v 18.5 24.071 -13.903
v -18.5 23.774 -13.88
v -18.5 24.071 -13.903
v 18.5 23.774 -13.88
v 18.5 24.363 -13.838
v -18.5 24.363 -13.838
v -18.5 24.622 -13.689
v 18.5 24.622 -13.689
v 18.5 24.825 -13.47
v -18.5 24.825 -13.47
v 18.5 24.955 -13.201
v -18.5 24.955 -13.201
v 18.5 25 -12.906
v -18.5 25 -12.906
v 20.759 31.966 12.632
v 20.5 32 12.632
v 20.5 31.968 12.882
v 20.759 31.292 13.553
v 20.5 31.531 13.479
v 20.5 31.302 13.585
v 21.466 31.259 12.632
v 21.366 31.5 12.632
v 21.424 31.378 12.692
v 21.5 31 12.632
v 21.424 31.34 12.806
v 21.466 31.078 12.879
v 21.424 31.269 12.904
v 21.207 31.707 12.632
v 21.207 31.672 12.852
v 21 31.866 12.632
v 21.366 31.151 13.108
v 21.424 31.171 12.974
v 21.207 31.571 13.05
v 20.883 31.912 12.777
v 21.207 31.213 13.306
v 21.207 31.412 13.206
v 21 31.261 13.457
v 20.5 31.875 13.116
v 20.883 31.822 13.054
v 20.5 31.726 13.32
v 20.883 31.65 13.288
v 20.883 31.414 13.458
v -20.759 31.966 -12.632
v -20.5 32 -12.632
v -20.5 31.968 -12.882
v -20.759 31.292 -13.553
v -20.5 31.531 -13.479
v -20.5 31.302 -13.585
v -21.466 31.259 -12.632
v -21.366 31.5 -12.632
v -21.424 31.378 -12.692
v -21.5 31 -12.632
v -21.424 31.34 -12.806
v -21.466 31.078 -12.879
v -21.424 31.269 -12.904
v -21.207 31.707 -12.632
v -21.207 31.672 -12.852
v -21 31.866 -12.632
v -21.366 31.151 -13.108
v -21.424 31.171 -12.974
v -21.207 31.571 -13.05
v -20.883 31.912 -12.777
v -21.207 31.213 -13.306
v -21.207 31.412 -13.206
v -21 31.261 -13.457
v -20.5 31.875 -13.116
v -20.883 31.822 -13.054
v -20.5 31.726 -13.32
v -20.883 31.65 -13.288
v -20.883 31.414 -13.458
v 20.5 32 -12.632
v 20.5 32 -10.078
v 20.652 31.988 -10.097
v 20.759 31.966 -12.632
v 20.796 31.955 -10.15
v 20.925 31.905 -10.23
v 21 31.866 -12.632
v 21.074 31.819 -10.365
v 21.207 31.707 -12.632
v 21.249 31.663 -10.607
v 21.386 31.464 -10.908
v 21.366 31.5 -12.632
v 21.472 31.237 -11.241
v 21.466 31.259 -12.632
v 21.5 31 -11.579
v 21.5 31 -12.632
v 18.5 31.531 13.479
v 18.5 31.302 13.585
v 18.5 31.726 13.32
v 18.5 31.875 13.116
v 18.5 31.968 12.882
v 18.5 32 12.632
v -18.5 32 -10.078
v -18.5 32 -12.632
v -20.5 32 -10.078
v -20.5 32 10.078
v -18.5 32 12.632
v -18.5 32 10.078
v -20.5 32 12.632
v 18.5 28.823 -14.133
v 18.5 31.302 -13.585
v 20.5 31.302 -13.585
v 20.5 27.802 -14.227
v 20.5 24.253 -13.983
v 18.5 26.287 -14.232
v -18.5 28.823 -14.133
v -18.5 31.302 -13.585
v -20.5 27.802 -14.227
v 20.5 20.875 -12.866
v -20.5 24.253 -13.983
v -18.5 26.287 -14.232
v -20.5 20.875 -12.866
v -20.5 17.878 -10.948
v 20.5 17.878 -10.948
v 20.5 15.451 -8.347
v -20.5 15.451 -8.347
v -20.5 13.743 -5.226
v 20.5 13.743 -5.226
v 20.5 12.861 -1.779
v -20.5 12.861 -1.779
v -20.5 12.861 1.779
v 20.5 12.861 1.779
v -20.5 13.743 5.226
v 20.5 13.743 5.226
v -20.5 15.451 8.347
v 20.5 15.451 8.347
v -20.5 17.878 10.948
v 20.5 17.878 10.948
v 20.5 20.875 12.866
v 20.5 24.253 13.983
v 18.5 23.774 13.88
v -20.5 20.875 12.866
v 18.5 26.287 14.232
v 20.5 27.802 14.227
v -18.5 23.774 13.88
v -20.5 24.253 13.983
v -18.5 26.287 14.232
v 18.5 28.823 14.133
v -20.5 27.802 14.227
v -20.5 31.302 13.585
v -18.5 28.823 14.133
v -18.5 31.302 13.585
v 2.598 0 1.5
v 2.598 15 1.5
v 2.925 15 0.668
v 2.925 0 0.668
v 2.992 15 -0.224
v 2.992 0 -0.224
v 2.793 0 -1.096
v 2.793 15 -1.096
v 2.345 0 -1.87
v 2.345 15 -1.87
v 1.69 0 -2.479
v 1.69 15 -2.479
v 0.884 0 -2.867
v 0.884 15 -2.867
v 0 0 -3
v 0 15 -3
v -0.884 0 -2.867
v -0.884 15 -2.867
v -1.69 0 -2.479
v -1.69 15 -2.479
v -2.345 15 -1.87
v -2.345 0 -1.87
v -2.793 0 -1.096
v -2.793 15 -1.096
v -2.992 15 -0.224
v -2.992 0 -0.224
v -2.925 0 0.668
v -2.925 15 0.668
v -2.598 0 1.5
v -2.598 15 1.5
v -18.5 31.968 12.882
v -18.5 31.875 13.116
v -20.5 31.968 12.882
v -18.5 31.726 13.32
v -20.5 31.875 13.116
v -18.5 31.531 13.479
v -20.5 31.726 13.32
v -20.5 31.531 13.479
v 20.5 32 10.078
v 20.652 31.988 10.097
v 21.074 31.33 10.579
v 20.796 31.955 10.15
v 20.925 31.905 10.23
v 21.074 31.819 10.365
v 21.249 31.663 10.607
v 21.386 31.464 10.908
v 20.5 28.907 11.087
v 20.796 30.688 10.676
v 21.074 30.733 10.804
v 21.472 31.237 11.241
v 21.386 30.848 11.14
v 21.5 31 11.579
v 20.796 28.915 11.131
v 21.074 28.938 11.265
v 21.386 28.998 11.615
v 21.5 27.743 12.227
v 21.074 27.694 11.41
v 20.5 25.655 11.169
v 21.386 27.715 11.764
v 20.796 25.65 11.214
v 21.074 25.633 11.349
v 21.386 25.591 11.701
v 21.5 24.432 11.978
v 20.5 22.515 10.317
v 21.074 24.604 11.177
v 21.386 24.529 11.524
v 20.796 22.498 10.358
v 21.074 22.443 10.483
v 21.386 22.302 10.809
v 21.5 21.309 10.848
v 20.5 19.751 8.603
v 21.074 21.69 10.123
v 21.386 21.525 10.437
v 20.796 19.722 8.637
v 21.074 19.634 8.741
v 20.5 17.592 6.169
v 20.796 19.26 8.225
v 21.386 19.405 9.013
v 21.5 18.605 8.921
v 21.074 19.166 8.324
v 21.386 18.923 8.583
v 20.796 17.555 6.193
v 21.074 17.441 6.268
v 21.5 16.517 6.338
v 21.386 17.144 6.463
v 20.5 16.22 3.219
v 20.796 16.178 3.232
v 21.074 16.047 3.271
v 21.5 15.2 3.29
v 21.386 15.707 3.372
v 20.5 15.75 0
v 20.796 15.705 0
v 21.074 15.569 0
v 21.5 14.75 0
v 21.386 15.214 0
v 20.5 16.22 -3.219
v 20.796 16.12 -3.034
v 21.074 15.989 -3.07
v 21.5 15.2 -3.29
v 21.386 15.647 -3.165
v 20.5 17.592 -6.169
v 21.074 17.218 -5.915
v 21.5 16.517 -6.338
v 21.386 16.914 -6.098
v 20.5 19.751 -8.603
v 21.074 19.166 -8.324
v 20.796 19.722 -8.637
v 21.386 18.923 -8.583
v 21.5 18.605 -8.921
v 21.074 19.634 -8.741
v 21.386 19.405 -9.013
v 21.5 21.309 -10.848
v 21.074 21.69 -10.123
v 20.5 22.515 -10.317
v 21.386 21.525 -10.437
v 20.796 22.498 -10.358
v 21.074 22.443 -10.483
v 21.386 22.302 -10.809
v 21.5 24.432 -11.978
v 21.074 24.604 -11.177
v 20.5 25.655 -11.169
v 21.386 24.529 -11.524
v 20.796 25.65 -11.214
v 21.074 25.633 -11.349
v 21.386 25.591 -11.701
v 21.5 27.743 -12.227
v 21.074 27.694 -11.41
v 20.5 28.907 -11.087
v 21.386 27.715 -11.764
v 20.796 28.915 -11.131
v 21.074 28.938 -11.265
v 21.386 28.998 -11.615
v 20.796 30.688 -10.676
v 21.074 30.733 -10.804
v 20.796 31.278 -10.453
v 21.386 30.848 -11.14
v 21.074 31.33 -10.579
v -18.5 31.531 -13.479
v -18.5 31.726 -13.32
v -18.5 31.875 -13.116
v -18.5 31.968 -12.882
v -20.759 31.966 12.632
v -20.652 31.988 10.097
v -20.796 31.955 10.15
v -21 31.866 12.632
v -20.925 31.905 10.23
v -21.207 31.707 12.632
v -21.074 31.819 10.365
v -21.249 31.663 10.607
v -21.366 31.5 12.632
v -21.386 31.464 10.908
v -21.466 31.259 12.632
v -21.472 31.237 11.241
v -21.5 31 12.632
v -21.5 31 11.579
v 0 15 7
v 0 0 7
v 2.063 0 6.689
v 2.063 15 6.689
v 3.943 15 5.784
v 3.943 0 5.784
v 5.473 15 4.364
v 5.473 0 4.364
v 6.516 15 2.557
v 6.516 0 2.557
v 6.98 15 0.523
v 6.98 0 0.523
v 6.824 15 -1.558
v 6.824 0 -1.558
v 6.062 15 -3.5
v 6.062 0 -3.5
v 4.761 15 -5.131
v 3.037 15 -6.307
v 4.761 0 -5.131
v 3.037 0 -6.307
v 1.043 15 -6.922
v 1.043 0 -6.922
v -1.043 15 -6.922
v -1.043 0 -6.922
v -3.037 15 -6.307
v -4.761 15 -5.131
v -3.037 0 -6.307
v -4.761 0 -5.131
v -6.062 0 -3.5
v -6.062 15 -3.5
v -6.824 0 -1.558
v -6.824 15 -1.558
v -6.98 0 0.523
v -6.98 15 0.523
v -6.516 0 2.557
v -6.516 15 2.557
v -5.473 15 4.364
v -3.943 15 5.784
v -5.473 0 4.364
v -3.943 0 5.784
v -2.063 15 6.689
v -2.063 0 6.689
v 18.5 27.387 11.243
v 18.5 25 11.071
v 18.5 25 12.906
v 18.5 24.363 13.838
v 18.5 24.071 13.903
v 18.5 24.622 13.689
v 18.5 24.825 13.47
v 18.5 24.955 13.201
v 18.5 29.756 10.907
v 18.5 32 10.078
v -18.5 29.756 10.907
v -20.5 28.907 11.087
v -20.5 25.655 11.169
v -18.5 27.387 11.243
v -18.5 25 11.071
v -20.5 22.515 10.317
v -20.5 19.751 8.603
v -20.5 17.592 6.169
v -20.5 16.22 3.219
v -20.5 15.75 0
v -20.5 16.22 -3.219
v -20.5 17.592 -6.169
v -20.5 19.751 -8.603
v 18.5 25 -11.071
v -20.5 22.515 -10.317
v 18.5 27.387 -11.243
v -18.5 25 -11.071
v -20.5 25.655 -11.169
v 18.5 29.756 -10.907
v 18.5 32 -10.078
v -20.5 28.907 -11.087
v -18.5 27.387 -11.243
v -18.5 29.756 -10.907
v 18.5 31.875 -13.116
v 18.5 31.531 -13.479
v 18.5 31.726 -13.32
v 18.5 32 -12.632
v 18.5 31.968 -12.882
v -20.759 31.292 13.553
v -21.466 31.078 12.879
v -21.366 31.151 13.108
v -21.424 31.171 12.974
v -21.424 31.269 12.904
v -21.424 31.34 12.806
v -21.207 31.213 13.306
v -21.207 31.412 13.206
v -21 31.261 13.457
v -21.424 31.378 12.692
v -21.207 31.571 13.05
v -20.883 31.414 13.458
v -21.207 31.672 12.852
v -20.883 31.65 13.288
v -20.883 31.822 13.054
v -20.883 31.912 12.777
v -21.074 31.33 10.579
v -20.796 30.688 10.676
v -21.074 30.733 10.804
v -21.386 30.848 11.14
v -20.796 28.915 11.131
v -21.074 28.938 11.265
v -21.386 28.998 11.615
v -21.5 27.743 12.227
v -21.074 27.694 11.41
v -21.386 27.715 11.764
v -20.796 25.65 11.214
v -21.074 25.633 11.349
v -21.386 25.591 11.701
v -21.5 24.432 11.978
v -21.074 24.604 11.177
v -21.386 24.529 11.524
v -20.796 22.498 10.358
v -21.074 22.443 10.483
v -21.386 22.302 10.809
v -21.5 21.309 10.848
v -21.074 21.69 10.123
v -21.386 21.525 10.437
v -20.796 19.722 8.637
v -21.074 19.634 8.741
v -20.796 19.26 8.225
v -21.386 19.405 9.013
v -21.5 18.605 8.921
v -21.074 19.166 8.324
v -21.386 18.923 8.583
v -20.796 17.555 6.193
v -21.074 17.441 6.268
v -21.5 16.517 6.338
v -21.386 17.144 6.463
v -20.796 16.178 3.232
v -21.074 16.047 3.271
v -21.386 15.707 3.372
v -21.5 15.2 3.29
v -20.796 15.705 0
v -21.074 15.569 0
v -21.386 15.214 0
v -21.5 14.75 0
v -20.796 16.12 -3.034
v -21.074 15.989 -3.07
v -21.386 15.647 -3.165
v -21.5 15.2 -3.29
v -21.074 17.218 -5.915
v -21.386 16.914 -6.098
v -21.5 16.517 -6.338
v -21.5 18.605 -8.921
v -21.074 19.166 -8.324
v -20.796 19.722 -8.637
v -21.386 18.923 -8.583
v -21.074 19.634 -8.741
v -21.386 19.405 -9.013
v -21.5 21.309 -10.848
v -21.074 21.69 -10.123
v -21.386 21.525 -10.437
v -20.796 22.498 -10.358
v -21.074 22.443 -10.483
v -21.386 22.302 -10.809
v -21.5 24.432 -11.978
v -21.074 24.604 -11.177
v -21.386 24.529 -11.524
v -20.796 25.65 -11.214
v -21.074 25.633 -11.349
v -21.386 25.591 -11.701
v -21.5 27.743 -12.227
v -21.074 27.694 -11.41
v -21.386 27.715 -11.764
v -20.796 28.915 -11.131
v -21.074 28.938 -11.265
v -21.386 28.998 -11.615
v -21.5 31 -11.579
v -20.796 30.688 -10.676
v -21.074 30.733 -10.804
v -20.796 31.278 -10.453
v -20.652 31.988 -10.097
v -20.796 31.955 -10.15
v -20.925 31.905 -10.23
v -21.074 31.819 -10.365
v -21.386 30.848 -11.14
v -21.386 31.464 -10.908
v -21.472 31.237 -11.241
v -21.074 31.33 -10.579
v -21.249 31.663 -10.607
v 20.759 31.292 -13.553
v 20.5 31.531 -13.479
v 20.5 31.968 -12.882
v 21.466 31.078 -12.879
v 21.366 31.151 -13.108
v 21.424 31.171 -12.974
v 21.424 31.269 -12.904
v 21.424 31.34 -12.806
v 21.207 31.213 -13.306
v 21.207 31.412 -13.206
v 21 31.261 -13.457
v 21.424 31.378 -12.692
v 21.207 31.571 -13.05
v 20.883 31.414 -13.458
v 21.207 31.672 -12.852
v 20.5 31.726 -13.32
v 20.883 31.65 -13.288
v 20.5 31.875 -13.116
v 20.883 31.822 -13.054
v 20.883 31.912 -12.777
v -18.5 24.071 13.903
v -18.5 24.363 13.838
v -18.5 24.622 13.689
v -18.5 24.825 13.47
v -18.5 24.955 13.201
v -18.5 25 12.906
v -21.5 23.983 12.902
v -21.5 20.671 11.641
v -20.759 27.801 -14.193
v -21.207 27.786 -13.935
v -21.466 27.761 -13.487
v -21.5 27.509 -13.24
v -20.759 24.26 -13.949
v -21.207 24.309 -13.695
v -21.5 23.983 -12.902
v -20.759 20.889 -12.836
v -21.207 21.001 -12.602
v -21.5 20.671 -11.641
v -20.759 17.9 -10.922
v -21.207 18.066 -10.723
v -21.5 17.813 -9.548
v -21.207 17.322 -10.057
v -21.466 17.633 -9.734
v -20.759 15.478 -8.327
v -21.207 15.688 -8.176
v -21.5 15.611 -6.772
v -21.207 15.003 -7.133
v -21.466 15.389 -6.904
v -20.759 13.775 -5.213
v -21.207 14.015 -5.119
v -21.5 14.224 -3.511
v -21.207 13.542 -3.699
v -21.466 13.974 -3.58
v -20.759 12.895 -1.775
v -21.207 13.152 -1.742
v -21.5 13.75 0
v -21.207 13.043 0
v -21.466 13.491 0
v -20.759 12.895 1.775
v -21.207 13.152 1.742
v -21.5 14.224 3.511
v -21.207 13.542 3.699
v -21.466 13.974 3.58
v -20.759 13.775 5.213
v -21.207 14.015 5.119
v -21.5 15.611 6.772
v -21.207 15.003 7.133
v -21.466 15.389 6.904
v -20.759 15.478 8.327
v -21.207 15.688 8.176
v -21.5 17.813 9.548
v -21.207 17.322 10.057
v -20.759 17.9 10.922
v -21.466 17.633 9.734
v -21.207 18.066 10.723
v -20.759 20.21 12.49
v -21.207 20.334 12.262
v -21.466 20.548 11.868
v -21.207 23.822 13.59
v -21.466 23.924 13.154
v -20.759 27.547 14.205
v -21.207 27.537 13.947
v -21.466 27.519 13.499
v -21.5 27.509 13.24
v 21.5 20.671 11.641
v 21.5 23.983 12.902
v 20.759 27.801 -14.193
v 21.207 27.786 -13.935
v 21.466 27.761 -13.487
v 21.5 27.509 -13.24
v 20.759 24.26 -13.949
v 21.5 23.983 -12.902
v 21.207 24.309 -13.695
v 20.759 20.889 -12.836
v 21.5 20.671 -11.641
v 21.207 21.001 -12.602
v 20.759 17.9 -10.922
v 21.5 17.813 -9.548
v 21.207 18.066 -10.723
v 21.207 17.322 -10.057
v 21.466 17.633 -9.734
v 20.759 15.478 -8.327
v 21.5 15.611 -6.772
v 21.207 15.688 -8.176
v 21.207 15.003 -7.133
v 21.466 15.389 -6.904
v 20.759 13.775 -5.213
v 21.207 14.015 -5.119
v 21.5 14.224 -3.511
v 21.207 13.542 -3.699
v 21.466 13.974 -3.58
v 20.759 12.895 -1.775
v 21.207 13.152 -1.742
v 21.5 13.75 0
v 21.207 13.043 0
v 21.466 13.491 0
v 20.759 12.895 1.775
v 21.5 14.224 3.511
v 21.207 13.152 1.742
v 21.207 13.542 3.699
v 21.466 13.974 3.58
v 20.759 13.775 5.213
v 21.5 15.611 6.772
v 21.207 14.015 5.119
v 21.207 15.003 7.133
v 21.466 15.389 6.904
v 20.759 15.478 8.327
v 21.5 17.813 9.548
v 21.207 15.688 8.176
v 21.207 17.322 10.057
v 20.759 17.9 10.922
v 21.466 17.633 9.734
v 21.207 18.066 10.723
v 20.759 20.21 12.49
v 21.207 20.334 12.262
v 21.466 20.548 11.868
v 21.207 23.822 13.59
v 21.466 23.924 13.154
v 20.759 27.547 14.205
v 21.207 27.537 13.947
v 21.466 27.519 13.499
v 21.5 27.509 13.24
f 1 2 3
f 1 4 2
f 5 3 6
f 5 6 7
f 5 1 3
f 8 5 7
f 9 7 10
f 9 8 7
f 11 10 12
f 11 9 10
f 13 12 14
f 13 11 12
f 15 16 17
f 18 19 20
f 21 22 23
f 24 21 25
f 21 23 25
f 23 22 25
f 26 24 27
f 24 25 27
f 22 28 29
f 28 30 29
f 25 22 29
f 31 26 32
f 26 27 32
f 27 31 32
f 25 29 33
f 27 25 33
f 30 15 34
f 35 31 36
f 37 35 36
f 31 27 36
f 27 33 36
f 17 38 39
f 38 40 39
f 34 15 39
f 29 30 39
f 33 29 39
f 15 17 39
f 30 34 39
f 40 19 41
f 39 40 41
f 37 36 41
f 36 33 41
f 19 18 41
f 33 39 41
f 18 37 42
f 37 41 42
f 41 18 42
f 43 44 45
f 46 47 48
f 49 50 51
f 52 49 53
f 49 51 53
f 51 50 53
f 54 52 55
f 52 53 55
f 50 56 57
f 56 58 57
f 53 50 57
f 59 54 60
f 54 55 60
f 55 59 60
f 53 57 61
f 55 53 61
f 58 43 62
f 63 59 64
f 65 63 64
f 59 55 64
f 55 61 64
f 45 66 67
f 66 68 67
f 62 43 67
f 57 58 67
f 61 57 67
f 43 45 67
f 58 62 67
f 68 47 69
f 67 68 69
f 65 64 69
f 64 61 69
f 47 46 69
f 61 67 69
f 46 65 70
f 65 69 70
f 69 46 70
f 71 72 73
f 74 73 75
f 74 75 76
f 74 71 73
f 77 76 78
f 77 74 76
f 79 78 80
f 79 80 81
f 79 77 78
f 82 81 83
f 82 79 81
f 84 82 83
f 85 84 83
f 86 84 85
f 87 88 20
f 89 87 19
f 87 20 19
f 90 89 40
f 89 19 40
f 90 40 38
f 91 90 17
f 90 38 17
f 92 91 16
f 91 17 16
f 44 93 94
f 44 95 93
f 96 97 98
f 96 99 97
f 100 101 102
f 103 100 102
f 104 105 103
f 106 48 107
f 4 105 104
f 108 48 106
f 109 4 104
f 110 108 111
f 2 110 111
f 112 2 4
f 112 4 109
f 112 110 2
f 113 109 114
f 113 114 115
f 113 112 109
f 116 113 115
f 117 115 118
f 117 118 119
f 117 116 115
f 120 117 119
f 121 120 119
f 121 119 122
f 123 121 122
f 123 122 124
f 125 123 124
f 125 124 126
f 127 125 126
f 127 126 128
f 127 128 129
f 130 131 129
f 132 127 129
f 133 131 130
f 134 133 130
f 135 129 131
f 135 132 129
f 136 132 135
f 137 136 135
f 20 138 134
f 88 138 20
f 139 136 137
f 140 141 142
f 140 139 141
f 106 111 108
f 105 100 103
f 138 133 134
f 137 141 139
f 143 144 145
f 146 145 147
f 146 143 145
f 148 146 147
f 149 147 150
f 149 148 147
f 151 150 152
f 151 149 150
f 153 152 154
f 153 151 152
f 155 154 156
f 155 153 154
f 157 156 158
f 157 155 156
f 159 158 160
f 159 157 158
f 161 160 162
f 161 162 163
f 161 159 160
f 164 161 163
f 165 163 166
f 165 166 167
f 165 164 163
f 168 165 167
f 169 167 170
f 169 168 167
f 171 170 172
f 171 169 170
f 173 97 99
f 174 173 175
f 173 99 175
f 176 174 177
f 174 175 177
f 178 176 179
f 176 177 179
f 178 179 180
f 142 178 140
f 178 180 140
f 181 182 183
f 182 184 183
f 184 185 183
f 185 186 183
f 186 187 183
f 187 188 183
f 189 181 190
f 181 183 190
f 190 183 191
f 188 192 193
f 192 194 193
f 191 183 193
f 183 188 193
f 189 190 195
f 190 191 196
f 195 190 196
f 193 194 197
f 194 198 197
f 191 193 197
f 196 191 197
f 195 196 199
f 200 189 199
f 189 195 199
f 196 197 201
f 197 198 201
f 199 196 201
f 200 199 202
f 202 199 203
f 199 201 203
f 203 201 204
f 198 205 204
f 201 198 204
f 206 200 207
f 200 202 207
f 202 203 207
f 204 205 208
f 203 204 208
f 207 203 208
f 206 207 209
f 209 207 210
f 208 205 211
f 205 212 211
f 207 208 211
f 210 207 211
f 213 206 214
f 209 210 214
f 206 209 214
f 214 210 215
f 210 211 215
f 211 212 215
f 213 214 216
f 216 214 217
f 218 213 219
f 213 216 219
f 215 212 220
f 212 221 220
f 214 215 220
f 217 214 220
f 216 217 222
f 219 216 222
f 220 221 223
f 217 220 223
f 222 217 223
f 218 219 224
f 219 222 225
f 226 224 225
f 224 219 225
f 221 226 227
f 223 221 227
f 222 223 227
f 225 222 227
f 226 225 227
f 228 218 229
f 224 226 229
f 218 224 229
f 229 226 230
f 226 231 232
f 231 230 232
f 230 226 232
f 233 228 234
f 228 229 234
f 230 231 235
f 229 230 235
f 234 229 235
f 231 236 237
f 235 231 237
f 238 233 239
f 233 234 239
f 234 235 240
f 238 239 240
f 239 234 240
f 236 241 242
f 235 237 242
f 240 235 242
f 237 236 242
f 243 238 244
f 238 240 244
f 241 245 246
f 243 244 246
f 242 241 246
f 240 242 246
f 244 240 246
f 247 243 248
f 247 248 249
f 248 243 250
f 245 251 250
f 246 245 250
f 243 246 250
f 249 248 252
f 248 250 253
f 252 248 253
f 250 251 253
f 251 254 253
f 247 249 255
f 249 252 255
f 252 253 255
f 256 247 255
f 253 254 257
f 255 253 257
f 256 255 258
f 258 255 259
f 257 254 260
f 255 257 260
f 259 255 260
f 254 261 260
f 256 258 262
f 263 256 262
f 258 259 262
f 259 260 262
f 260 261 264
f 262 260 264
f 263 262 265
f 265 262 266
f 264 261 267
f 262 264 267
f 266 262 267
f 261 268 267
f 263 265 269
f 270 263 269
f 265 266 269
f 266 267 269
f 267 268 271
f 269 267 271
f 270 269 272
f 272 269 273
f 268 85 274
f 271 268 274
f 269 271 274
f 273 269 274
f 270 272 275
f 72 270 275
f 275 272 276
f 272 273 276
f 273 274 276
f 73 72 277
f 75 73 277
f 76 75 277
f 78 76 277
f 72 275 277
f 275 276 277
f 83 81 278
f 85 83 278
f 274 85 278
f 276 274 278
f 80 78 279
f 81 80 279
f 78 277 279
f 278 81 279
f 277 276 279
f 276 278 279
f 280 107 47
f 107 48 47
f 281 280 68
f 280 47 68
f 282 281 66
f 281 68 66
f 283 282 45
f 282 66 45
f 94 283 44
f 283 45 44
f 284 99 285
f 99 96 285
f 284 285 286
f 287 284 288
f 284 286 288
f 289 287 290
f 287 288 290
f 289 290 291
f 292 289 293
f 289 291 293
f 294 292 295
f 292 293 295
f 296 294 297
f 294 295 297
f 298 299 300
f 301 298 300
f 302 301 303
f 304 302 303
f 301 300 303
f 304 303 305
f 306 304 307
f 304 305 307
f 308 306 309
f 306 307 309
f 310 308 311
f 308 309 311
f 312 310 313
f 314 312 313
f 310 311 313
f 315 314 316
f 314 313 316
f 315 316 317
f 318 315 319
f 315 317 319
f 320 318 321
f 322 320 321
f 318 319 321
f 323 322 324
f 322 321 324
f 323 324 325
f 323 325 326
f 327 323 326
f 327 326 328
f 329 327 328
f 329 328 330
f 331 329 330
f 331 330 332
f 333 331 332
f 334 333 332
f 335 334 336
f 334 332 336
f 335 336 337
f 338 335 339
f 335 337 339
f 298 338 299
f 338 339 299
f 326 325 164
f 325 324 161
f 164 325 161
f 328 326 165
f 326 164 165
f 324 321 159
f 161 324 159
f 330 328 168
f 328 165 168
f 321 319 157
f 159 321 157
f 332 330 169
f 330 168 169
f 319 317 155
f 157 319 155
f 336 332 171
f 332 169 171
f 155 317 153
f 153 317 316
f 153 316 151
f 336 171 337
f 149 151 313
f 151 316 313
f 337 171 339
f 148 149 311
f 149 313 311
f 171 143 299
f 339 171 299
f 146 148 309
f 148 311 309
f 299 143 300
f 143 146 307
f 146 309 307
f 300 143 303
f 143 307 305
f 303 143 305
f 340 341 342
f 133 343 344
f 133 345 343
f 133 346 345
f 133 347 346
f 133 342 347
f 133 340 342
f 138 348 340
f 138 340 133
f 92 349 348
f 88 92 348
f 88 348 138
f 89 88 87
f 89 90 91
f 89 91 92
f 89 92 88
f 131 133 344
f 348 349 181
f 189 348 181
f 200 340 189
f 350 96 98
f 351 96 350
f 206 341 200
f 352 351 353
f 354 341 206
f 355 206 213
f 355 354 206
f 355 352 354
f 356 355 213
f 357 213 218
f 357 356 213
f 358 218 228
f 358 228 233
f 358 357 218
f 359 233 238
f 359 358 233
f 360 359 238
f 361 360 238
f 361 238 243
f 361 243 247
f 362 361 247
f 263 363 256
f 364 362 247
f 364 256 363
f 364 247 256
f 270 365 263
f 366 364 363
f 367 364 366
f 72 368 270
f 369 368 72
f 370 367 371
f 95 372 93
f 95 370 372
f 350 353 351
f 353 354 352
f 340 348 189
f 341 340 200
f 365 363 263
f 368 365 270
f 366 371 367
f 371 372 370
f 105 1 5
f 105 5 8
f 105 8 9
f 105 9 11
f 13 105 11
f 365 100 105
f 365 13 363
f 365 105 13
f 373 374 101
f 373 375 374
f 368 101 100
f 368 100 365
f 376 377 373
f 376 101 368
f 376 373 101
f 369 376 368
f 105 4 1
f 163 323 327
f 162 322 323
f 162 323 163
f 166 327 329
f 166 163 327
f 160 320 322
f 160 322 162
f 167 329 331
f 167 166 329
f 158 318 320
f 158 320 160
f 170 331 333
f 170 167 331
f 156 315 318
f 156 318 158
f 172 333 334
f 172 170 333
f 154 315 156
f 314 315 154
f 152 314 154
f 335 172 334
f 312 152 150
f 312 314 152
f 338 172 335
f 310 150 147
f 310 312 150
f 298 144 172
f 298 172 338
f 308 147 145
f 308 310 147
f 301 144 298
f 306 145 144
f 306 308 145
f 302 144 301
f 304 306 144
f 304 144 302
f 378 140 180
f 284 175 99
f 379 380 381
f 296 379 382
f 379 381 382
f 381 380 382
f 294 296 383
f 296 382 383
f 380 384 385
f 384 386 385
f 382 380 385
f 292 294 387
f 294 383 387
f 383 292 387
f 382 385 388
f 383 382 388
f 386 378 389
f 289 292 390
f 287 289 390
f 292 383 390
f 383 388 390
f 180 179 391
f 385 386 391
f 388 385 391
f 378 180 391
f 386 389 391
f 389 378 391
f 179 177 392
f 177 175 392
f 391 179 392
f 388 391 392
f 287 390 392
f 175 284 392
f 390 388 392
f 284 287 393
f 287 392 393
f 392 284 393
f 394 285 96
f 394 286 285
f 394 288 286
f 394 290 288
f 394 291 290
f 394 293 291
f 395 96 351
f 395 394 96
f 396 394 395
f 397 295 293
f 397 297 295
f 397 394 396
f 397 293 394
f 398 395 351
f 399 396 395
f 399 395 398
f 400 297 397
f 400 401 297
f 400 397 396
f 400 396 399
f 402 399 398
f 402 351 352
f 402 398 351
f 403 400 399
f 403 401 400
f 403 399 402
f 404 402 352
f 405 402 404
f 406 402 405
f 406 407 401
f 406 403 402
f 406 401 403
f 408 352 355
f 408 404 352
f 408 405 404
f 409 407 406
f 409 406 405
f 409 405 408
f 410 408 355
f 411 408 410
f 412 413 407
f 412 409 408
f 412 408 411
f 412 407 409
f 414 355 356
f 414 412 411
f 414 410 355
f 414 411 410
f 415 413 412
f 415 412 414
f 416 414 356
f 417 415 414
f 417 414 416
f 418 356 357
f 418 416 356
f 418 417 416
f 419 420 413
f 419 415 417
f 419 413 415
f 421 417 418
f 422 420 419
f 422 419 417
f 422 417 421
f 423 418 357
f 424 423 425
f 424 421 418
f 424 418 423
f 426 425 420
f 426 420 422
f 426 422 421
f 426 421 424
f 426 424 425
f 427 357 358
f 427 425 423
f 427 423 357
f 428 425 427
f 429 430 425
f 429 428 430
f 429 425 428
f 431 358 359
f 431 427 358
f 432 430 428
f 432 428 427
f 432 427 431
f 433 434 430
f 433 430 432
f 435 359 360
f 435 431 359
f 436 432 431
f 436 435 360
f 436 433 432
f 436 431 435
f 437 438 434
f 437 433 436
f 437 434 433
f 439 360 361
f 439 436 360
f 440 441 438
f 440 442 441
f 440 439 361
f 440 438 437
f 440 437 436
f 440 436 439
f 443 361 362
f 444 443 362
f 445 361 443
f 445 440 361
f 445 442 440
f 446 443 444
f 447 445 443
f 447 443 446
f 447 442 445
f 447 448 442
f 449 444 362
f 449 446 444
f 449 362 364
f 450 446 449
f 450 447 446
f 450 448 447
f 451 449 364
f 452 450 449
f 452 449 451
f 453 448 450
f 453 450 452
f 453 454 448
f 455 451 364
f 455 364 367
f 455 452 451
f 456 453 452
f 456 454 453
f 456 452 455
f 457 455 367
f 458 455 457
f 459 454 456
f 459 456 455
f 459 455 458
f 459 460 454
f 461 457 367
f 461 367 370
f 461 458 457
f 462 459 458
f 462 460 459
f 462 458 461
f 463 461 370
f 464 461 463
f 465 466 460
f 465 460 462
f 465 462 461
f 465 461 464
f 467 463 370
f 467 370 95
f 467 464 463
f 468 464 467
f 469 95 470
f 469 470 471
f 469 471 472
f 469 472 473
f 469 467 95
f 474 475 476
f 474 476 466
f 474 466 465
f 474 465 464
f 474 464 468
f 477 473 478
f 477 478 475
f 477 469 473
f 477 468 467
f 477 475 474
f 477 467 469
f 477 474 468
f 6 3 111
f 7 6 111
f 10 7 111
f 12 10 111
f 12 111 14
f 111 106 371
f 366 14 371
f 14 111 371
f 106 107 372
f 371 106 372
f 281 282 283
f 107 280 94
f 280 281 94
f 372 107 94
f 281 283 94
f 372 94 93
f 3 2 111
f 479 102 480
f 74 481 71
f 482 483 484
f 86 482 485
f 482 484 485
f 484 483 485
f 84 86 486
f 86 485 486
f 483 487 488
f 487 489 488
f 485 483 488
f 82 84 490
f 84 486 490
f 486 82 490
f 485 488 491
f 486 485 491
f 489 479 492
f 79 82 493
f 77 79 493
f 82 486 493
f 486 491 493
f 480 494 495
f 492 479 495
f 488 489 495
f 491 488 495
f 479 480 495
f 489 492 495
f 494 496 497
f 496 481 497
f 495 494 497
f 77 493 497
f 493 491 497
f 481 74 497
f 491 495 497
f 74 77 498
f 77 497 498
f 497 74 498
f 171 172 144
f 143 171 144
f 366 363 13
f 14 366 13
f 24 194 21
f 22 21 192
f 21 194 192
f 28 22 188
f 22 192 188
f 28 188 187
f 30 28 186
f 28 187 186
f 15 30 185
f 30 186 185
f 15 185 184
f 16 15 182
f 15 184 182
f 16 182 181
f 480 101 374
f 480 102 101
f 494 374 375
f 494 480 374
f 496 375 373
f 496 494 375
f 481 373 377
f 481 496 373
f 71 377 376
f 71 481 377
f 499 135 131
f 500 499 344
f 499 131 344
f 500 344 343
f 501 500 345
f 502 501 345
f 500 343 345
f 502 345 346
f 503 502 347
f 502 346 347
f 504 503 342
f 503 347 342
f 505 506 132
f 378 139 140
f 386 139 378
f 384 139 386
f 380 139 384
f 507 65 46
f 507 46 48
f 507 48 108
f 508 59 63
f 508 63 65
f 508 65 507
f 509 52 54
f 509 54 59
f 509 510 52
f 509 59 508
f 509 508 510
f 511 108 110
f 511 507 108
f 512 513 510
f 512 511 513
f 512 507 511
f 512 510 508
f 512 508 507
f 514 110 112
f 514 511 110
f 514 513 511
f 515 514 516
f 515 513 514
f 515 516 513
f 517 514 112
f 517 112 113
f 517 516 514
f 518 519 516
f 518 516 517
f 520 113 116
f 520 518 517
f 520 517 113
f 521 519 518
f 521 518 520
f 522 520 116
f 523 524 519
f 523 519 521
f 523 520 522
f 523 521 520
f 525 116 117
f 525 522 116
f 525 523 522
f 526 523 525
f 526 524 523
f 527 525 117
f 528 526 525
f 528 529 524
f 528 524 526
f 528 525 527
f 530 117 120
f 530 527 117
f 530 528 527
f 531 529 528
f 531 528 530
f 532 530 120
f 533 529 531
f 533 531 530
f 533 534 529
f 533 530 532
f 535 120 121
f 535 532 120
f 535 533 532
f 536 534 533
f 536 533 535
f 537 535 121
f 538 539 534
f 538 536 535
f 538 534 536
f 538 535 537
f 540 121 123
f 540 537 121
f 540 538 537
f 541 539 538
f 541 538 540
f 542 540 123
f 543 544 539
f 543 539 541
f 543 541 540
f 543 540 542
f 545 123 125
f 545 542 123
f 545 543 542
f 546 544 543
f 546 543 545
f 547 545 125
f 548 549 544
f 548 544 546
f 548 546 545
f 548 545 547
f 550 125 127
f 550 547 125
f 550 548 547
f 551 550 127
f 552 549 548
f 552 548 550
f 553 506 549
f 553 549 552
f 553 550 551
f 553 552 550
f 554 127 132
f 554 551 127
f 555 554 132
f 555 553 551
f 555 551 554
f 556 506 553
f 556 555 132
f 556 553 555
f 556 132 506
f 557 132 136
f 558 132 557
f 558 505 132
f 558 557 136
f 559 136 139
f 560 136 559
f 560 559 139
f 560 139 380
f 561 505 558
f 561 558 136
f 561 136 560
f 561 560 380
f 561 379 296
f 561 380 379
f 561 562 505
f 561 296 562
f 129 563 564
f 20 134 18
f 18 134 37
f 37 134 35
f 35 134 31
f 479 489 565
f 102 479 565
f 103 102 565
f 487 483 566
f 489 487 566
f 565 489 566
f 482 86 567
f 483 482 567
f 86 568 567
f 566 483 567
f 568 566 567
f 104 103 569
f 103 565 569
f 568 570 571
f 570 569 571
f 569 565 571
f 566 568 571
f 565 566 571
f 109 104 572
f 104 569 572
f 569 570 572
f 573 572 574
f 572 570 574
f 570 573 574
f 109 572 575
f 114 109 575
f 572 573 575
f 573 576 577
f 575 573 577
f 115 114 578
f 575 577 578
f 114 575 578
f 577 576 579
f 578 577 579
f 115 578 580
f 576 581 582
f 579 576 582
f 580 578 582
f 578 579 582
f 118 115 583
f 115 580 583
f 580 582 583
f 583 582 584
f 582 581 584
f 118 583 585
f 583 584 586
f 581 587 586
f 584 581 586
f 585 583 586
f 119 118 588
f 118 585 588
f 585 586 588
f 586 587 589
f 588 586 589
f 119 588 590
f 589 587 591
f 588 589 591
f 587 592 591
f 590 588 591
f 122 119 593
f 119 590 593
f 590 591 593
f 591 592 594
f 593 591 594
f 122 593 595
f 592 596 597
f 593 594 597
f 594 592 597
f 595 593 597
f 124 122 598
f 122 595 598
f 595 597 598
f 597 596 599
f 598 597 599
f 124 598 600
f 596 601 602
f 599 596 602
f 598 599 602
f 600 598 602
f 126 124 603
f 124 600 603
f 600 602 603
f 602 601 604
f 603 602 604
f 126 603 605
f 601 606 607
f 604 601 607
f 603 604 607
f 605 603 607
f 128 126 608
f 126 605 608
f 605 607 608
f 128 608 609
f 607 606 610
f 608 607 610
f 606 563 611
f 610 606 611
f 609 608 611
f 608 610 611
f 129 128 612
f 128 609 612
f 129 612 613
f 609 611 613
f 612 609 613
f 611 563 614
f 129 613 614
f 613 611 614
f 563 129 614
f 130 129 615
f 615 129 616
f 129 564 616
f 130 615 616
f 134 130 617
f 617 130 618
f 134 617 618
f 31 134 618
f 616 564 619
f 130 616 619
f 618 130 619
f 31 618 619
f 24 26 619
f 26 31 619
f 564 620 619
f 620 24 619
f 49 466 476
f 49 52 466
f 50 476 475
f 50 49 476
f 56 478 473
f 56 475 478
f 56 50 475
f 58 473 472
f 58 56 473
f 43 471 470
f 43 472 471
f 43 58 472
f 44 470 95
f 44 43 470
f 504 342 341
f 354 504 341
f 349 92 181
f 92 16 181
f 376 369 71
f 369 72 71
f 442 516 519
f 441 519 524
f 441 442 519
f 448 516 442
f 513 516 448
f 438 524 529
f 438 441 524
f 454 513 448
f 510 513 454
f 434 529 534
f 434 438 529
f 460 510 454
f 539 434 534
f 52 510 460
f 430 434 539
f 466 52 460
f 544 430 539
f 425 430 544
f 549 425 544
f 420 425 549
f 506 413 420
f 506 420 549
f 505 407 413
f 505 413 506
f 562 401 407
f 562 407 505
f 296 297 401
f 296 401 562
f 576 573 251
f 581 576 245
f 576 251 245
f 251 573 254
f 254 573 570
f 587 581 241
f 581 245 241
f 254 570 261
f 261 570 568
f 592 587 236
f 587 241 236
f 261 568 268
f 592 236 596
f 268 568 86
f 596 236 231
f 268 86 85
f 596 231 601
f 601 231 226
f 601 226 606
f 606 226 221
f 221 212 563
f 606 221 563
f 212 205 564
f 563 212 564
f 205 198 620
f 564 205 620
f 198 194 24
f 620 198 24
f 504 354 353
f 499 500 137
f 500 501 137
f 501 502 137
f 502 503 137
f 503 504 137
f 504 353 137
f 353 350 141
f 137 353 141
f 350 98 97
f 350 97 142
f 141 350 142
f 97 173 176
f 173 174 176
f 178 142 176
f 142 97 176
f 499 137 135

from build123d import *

# Parameters (mm, degrees)
SKETCH1_R           = 7
BOSS_EXTRUDE1_DEPTH = 15
BOSS_EXTRUDE2_DEPTH = 20
BOSS_EXTRUDE3_DEPTH = 1.5
FILLET1_R           = 1


with BuildPart() as part:
    # Sketch1 → Boss-Extrude1 (new body)
    with BuildSketch(Plane(origin=(0, 0, 0), x_dir=(1, 0, 0), z_dir=(0, 1, 0))):
        with Locations(Location((0, 0, 0), (0, 0, 270))):
            Circle(SKETCH1_R)
        with BuildLine():
            Line((-2.598076211, -1.5), (2.598076211, -1.5))
            ThreePointArc((2.598076211, -1.5), (0, 3), (-2.598076211, -1.5))
        make_face(mode=Mode.SUBTRACT)
    extrude(amount=BOSS_EXTRUDE1_DEPTH)


with BuildPart() as body_2:
    # Sketch2 → Boss-Extrude2 (new, symmetric)
    with BuildSketch(Plane(origin=(0, 0, 0), x_dir=(0, 0, -1), z_dir=(1, 0, 0))):
        with BuildLine():
            Line((-14.10895106, 25), (-11.070794913, 25))
            ThreePointArc((-11.070794913, 25), (0, 15.75), (11.070794913, 25))
            Line((11.070794913, 25), (14.10895106, 25))
            ThreePointArc((14.10895106, 25), (0, 12.75), (-14.10895106, 25))
        make_face()
    extrude(amount=BOSS_EXTRUDE2_DEPTH, both=True)

    # Sketch3 → Boss-Extrude3 (add, symmetric)
    with BuildSketch(Plane(origin=(20, 0, 0), x_dir=(0, 0, -1), z_dir=(1, 0, 0))):
        with BuildLine():
            Line((-13.344006145, 32), (-10.077822185, 32))
            ThreePointArc((-10.077822185, 32), (0, 15.75), (10.077822185, 32))
            Line((10.077822185, 32), (13.344006145, 32))
            ThreePointArc((13.344006145, 32), (0, 12.75), (-13.344006145, 32))
        make_face()
    boss_extrude3 = extrude(amount=BOSS_EXTRUDE3_DEPTH, both=True)

    # Mirror1: Boss-Extrude3 across plane
    add(boss_extrude3.mirror(Plane(origin=(0, 0, 0), x_dir=(0, 0, 1), z_dir=(1, 0, 0))))

    # Fillet1
    fillet1_edges = [body_2.edges().sort_by_distance(p)[0] for p in [
        (0, 25, -14.10895106),
        (0, 25, 14.10895106),
        (20, 32, 13.344006145),
        (20, 32, -13.344006145),
        (21.5, 15.75, 0),
        (21.5, 32, 11.710914165),
        (21.5, 12.75, 0),
        (21.5, 32, -11.710914165),
        (-21.5, 15.75, 0),
        (-21.5, 12.75, 0),
        (-20, 32, -13.344006145),
        (-21.5, 32, -11.710914165),
        (-21.5, 32, 11.710914165),
        (-20, 32, 13.344006145),
    ]]
    fillet(fillet1_edges, radius=FILLET1_R)


solid = Compound([part.part, body_2.part])
